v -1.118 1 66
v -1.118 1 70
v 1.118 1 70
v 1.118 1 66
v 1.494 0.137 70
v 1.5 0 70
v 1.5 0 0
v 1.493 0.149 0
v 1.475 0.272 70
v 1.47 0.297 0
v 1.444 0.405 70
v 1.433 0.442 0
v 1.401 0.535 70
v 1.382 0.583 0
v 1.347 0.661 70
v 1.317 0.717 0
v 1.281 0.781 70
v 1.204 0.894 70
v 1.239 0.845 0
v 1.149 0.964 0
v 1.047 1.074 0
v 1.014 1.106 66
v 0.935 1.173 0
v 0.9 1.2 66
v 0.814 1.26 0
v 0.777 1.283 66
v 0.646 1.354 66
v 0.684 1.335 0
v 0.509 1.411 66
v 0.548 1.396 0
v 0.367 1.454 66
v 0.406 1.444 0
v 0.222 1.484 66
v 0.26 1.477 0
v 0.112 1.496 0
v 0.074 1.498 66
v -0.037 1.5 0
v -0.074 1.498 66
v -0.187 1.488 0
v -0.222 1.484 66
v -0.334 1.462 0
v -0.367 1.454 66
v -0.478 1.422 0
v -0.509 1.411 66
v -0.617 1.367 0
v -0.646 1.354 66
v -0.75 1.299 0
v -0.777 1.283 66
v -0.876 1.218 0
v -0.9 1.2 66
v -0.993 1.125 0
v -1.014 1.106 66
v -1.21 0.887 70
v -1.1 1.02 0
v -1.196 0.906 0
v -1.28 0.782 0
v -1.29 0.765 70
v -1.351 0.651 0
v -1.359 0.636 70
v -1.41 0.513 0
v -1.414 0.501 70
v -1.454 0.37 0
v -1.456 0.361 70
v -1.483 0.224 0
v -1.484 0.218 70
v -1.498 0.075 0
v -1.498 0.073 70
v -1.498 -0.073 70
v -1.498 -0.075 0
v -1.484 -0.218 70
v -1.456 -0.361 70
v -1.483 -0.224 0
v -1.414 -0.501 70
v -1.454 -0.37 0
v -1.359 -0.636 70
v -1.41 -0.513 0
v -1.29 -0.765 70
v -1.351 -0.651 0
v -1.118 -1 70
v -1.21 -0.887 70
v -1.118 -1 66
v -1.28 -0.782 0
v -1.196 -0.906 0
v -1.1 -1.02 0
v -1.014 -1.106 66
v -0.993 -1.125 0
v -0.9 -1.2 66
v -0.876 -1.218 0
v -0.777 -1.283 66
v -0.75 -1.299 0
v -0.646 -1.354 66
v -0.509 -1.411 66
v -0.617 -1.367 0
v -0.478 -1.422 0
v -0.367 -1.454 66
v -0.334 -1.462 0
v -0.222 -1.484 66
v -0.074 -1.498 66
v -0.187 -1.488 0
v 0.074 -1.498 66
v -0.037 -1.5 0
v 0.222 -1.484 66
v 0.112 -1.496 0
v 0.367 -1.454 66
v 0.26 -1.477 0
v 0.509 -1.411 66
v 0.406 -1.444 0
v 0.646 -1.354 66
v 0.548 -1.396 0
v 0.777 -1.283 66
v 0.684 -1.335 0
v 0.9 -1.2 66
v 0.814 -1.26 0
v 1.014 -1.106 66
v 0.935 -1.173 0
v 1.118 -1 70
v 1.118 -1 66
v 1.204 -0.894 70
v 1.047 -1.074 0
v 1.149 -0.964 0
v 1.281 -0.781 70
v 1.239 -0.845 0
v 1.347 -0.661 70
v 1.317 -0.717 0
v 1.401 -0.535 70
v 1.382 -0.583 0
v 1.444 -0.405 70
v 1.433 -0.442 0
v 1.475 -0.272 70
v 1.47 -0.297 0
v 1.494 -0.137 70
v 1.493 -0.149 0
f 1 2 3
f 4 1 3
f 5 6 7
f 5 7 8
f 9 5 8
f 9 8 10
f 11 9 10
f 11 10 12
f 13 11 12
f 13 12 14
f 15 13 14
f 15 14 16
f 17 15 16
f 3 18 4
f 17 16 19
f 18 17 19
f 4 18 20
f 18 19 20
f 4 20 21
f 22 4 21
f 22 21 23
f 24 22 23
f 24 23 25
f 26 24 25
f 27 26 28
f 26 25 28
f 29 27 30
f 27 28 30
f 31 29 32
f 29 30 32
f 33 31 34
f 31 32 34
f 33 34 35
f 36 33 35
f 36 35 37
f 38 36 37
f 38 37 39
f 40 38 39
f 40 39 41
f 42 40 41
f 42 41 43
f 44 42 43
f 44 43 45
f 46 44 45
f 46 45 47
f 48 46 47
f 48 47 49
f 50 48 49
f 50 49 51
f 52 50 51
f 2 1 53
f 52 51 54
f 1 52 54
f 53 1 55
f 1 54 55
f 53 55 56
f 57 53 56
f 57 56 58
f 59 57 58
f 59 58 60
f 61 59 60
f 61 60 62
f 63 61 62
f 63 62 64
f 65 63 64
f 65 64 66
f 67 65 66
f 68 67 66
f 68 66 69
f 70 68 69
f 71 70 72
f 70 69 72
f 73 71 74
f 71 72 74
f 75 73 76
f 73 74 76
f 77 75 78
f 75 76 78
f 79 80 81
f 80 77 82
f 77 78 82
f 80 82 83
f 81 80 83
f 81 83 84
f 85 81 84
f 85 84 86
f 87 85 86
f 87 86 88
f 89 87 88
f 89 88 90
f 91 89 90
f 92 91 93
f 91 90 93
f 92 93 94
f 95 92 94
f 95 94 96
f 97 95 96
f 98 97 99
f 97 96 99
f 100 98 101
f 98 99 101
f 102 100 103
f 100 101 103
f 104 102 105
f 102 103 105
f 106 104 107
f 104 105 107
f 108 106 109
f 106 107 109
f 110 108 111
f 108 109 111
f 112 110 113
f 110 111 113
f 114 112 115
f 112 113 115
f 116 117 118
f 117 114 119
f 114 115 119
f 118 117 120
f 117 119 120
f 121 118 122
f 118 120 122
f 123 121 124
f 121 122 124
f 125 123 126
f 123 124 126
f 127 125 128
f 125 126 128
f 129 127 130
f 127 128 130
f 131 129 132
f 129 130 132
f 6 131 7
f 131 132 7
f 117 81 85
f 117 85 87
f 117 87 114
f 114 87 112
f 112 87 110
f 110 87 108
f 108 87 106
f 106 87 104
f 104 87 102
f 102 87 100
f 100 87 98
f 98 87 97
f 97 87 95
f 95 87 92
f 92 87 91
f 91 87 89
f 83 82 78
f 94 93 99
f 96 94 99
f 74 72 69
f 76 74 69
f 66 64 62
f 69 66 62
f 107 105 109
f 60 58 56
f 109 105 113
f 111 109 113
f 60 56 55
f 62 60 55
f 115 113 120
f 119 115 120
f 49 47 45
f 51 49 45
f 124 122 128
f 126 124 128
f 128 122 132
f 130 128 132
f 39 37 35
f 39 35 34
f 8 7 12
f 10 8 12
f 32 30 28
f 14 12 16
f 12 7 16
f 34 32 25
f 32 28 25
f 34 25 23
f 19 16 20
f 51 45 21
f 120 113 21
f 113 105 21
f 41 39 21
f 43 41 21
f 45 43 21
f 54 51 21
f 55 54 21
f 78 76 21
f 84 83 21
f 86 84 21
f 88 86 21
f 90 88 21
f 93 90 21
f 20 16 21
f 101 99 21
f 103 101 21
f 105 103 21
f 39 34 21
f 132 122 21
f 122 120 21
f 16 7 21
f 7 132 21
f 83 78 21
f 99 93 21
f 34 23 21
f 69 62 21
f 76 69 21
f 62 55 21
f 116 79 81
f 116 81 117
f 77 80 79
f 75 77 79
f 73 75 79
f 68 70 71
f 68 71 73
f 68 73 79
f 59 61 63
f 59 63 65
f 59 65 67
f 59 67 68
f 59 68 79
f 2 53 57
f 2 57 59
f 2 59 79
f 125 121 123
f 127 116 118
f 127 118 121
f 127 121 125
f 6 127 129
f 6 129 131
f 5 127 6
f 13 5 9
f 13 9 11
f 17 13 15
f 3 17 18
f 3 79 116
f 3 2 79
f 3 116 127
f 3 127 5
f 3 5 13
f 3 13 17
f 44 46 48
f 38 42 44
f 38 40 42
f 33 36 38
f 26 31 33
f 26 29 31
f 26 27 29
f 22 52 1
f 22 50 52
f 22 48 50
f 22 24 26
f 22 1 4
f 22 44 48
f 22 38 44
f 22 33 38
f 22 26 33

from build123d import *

# Parameters (mm, degrees)
SKETCH_1_R          = 1.5
EXTRUDE_1_DEPTH     = 70
SKETCH_2_W          = 4
SKETCH_2_H          = 1
CUT_EXTRUDE_2_DEPTH = 4


with BuildPart() as part:
    # 草图1 → 凸台-拉伸1 (new body)
    with BuildSketch(Plane.XY):
        Circle(SKETCH_1_R)
    extrude(amount=EXTRUDE_1_DEPTH)

    # 草图2 → 切除-拉伸2 (cut)
    with BuildSketch(Plane.XY.offset(70)):
        with Locations((0.214520216, -1.5)):
            Rectangle(SKETCH_2_W, SKETCH_2_H)
        with Locations((0.214520216, 1.5)):
            Rectangle(SKETCH_2_W, SKETCH_2_H)
    extrude(amount=-CUT_EXTRUDE_2_DEPTH, mode=Mode.SUBTRACT)


solid = part.part
